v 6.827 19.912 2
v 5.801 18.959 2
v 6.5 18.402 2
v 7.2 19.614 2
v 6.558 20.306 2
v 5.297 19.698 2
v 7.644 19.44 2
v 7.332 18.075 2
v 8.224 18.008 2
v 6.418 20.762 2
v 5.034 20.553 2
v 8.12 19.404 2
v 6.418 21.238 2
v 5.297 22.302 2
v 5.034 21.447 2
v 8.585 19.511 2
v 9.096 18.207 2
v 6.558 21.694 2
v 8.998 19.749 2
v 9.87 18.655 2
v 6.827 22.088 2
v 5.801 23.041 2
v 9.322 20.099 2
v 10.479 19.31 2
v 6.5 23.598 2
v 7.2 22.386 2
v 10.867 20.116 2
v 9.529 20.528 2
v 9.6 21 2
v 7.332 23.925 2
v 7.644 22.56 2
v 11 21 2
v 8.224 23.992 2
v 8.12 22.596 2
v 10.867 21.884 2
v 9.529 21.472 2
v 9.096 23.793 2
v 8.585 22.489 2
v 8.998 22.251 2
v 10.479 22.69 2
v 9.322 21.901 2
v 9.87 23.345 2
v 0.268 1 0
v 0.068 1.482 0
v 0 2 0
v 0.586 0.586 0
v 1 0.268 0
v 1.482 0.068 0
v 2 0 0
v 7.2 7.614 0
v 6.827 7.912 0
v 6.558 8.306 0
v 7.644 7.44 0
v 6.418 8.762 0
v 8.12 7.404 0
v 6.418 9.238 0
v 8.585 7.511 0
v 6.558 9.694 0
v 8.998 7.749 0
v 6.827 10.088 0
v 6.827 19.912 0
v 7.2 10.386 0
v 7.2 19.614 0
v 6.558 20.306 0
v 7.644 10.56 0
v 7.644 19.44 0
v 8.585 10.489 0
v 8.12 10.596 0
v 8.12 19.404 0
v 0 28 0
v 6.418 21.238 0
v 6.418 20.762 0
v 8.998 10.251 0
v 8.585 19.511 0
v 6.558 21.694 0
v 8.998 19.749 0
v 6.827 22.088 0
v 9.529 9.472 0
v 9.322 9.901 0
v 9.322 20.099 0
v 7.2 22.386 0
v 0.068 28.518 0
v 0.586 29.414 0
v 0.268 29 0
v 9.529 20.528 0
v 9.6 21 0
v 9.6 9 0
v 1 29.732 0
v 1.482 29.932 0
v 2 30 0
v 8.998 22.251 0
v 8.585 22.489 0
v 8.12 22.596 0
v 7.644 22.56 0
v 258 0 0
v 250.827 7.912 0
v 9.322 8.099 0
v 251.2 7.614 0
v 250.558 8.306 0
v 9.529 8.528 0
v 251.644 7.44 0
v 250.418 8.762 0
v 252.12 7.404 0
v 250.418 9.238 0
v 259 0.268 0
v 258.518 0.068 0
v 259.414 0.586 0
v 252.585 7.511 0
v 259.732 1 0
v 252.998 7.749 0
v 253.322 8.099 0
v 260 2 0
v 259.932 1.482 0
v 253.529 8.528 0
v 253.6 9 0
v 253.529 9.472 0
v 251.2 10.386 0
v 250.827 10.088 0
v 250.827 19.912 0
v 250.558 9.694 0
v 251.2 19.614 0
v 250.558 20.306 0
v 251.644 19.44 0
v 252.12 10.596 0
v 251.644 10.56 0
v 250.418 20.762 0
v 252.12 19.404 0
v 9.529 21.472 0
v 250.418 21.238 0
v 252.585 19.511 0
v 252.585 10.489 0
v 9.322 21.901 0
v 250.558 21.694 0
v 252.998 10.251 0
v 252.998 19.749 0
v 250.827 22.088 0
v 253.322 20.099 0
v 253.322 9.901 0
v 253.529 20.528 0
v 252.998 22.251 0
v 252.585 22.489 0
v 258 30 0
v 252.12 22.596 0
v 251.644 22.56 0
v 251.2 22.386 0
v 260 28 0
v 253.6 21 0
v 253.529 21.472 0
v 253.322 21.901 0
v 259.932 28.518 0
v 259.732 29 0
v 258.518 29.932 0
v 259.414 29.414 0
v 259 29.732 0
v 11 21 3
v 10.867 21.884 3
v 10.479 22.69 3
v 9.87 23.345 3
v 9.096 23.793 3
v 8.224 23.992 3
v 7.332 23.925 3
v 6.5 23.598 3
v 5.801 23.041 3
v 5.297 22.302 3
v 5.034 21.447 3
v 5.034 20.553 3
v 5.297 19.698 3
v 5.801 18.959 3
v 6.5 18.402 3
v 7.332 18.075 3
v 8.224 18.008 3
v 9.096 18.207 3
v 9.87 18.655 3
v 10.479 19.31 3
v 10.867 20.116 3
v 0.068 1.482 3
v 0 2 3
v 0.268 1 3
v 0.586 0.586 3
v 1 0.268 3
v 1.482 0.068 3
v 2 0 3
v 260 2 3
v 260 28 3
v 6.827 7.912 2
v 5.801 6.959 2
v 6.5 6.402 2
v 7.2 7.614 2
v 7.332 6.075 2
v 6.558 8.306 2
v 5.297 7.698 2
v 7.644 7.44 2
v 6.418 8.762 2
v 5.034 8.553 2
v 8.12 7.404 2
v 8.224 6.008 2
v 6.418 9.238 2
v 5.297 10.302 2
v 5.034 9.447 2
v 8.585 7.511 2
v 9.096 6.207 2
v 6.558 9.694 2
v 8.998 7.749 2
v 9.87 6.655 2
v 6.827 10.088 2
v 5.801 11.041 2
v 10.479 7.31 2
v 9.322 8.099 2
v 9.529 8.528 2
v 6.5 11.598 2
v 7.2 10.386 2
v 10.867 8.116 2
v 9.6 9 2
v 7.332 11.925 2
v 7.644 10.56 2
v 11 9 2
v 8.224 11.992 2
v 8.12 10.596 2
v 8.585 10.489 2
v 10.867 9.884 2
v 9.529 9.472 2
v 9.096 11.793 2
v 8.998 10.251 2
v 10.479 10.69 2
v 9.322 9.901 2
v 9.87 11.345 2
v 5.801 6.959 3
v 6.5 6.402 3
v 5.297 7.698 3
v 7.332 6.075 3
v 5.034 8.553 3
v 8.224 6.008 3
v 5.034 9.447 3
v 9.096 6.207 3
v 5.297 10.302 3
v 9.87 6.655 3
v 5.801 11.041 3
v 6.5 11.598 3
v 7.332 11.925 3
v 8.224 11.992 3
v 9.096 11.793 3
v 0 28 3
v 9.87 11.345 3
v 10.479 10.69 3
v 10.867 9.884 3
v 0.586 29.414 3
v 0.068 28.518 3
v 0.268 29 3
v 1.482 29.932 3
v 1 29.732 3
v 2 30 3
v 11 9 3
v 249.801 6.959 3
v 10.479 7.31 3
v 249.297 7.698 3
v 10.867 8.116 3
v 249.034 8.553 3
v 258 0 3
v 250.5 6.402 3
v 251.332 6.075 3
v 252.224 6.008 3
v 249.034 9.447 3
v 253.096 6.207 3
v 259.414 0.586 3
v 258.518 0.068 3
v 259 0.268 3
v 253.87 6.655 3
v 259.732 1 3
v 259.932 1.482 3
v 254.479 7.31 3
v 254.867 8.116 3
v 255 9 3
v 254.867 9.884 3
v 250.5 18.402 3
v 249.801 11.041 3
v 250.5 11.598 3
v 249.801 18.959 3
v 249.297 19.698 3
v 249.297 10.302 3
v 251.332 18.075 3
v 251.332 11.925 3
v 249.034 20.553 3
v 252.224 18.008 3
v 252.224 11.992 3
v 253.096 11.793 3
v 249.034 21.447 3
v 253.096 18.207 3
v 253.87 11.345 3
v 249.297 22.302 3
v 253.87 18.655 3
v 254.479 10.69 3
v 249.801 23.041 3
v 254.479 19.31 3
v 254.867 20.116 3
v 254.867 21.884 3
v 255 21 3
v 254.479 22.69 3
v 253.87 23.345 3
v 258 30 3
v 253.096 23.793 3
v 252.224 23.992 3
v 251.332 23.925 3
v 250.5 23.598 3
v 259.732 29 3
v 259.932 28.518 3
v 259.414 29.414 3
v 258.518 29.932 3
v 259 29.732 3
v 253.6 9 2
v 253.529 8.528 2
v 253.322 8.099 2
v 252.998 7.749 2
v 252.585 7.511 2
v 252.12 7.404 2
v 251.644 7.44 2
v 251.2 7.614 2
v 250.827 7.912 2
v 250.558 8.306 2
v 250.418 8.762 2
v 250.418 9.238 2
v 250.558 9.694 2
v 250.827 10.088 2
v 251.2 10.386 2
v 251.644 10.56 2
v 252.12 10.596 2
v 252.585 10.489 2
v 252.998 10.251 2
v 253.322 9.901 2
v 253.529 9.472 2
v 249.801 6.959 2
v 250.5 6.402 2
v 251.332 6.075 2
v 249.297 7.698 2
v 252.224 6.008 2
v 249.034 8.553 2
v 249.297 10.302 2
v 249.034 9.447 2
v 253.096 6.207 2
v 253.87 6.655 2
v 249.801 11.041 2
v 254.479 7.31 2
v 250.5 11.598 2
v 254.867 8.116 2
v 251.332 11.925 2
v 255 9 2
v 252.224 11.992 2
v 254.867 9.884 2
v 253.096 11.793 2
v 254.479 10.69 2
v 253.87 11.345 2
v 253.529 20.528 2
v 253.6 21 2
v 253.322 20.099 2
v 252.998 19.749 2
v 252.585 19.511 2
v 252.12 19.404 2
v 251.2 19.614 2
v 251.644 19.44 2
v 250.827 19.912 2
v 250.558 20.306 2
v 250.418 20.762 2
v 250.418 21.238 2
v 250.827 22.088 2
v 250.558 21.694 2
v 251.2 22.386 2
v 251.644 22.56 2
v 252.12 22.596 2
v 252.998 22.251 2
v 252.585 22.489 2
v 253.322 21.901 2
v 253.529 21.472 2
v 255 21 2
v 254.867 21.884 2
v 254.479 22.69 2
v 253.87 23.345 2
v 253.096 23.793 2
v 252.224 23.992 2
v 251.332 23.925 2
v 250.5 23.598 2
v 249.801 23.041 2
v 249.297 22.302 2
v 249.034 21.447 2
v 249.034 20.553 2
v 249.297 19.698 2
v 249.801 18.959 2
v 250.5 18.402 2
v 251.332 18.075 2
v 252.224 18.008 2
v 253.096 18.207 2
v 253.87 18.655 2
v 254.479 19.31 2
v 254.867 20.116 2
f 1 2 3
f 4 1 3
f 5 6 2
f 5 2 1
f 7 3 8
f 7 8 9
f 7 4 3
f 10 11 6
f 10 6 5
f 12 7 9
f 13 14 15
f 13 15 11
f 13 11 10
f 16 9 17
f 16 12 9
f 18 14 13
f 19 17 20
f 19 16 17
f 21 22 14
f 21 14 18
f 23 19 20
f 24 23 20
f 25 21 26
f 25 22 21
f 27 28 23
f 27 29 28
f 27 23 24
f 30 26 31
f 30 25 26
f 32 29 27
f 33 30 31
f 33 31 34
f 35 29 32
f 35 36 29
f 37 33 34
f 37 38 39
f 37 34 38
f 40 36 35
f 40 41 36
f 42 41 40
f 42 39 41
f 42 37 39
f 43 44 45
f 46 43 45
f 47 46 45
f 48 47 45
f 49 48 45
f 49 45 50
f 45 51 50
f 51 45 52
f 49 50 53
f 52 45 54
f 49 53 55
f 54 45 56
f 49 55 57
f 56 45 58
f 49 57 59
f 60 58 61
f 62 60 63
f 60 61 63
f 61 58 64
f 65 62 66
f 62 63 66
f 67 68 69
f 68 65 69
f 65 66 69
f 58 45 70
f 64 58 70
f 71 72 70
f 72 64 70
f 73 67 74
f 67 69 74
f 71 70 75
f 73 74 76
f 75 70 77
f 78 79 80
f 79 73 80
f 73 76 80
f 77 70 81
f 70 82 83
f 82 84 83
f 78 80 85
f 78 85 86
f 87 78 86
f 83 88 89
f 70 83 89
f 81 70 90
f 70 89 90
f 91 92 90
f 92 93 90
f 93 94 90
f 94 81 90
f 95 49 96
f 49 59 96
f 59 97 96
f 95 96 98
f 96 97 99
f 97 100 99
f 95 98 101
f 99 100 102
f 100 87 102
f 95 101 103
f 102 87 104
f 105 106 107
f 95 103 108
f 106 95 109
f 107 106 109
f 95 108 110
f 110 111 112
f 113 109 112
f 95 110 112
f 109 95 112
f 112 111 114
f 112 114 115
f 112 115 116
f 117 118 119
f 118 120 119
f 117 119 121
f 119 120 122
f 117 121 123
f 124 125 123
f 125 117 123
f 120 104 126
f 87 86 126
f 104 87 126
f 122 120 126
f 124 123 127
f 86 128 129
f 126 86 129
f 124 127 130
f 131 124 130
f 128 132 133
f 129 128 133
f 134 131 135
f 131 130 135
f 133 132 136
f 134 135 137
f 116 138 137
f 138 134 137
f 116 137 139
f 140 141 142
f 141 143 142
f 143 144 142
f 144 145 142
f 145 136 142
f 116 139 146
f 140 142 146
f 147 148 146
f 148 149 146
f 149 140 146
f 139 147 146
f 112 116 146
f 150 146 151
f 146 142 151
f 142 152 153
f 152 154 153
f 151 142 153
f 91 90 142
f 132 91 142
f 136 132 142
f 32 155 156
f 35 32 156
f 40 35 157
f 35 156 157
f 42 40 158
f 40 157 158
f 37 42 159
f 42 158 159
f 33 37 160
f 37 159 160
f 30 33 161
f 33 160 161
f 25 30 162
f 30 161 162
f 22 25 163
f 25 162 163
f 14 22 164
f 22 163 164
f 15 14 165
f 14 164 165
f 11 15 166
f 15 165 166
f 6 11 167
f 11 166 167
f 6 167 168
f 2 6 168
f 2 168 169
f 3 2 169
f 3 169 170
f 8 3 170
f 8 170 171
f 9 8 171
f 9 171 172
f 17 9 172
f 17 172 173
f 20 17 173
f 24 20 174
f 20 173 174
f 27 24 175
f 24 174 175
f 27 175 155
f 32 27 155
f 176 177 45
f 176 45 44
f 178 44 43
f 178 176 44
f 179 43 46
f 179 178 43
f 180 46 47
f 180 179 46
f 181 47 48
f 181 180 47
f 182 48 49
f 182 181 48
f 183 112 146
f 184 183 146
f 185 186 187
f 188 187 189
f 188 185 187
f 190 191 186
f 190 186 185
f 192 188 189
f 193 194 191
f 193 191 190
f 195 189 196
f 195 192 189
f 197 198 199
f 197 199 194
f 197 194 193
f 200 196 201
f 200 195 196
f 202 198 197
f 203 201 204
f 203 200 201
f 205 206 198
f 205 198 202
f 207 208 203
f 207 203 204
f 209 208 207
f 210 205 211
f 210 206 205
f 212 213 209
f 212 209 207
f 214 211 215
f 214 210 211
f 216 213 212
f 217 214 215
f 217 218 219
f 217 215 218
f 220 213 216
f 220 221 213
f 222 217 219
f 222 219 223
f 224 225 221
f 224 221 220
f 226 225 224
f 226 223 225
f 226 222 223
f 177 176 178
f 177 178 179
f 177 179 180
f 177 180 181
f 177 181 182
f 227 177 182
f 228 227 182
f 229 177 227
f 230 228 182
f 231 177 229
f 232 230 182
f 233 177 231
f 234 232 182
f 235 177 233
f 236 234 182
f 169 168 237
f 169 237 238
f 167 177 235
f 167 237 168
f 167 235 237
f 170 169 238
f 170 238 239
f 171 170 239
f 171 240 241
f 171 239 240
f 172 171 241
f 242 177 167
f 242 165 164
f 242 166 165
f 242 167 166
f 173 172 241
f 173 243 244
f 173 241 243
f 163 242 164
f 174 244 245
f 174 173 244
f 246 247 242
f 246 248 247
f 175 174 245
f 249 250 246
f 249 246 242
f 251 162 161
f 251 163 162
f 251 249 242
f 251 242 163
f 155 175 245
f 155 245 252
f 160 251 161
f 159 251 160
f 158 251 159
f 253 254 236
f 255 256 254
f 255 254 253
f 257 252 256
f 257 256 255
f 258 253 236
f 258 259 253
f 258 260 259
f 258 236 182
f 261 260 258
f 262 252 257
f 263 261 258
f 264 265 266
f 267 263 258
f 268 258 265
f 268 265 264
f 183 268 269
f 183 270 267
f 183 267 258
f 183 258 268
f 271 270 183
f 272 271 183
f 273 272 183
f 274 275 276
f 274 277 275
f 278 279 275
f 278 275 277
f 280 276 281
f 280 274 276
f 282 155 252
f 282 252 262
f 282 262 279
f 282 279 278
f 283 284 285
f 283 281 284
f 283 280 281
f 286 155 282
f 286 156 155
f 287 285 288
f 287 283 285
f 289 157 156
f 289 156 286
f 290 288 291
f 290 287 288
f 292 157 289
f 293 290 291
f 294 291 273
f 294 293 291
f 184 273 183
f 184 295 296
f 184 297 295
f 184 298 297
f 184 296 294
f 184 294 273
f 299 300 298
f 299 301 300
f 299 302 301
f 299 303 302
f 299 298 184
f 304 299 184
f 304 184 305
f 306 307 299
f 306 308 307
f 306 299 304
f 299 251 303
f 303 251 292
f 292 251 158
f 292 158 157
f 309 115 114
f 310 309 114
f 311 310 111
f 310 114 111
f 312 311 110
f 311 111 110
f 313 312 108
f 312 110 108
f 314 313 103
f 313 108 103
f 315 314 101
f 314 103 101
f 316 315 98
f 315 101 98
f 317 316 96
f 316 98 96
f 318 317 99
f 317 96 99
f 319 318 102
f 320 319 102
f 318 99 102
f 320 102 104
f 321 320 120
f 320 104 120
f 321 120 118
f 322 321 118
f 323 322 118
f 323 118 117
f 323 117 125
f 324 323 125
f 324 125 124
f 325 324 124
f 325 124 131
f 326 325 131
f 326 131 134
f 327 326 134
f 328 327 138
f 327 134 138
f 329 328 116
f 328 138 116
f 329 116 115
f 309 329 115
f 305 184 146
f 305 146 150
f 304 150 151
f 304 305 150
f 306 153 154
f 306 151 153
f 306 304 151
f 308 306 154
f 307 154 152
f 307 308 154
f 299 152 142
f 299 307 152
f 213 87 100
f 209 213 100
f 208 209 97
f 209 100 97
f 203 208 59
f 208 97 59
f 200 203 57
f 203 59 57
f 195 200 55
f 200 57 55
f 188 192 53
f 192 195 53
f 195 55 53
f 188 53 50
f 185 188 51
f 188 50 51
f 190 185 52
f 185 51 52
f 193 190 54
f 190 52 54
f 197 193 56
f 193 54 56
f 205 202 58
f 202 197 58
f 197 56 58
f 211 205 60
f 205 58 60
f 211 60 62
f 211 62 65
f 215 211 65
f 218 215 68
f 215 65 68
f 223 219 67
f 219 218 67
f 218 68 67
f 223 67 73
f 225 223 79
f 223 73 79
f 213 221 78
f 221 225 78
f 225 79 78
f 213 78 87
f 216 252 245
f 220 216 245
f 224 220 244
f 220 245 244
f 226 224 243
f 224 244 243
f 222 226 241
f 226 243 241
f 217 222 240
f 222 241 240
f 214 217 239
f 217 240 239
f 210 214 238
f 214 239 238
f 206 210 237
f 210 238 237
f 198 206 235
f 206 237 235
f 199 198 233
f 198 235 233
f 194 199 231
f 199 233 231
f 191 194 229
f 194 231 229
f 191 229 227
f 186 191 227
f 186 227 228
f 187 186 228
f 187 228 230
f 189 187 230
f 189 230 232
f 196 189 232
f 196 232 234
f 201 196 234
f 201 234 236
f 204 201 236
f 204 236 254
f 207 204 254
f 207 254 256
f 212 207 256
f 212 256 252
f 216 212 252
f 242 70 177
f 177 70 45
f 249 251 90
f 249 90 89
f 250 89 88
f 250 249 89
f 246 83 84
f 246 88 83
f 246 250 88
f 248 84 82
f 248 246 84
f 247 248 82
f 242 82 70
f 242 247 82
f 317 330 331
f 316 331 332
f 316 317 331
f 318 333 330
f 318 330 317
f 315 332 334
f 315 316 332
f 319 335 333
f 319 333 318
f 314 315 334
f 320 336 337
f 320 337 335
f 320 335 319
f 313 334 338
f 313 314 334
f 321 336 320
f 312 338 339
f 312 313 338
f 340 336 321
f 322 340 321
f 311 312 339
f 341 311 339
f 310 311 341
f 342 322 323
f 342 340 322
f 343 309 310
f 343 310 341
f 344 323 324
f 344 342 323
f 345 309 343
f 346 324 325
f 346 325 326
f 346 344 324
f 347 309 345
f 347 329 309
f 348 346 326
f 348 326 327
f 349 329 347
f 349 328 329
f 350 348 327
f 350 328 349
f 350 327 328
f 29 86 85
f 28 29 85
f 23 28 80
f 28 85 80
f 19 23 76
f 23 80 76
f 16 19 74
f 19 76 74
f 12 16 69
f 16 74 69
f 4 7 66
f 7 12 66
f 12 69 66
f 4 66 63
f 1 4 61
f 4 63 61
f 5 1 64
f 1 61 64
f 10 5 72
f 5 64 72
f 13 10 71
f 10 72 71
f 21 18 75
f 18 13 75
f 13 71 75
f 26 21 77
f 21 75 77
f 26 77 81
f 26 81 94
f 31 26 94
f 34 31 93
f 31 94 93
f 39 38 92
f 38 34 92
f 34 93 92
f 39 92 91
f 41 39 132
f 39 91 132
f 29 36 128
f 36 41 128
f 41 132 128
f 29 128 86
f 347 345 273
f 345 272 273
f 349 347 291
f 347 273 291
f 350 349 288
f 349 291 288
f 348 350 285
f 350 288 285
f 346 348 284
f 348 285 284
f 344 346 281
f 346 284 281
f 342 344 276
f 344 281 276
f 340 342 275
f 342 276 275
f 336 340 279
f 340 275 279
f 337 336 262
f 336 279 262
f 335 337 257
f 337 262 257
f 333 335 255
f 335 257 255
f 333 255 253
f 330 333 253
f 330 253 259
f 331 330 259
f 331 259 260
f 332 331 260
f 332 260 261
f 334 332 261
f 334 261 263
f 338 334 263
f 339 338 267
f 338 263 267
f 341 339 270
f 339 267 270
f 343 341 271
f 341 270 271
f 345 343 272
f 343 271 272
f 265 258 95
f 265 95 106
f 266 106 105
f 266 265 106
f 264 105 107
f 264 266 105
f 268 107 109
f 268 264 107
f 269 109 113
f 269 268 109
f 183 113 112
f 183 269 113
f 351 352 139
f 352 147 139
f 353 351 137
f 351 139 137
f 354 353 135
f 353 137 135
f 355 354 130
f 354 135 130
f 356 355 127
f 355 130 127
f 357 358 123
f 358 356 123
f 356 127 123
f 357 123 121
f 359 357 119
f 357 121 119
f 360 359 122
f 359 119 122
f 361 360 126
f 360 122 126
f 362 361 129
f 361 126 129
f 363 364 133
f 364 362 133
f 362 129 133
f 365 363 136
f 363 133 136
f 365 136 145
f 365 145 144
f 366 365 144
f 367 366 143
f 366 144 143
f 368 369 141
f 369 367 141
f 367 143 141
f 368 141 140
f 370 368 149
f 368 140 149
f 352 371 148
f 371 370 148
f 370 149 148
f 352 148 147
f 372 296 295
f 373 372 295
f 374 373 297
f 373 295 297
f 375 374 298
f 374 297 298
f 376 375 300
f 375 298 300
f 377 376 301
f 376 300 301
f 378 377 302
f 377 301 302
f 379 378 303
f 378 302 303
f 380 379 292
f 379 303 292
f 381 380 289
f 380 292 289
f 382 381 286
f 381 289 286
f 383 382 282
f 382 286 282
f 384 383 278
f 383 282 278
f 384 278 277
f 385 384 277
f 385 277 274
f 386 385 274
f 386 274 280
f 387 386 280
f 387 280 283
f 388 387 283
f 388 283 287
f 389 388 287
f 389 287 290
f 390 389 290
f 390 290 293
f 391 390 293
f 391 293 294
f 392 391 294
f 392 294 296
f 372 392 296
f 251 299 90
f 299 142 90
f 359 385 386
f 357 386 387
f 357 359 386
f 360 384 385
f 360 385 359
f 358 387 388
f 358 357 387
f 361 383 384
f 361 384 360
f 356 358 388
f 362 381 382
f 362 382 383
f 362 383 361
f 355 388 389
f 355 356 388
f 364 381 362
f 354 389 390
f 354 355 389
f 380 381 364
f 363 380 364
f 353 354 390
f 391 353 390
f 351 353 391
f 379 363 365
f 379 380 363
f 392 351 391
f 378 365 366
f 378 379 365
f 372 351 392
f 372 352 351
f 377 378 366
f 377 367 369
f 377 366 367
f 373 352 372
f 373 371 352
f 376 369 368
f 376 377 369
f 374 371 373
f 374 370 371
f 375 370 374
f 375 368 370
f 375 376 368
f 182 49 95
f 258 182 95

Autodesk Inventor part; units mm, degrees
ref_plane "YZ Plane" through (0, 0, 0) normal (1, 0, 0) x (0, 1, 0)
ref_plane "XZ Plane" through (0, 0, 0) normal (0, 1, 0) x (-1, 0, 0)
ref_plane "XY Plane" through (0, 0, 0) normal (0, 0, 1) x (1, 0, 0)
sketch "スケッチ1" plane through (0, 0, 0) normal (0, 0, 1) x (1, 0, 0)
  line L0 (0, 0) -> (260, 0)
  line L1 (260, 0) -> (260, 30)
  line L2 (260, 30) -> (0, 30)
  line L3 (0, 30) -> (0, 0)
  line L4 (0, 15) -> (260, 15)
  circle A0 centre (8, 21) radius 1.6
  circle A1 centre (8, 9) radius 1.6
  circle A2 centre (252, 21) radius 1.6
  circle A3 centre (252, 9) radius 1.6
  point P0 (8, 15)
  point P1 (252, 15)
  dimension "d0" = 260
  dimension "d1" = 244
  dimension "d2" = 8
  dimension "d3" = 30
  dimension "d4" = 15
  dimension "d5" = 9
  dimension "d6" = 9
  dimension "d7" = 9
  dimension "d8" = 9
  dimension "d9" = 3.2
  dimension "d10" = 3.2
  dimension "d11" = 3.2
  dimension "d12" = 3.2
extrude "押し出し1" add sketch "スケッチ1" along normal blind 3
sketch "スケッチ2" plane through (0, 0, 3) normal (0, 0, 1) x (1, 0, 0)
  line L0 (0, 30) -> (0, 0) projected
  line L1 (0, 0) -> (260, 0) projected
  line L2 (260, 0) -> (260, 30) projected
  line L3 (260, 30) -> (0, 30) projected
  circle A0 centre (8, 9) radius 1.6 projected
  circle A1 centre (252, 9) radius 1.6 projected
  circle A2 centre (252, 21) radius 1.6 projected
  circle A3 centre (8, 21) radius 1.6 projected
  circle A4 centre (8, 21) radius 3
  circle A5 centre (8, 9) radius 3
  circle A6 centre (252, 21) radius 3
  circle A7 centre (252, 9) radius 3
  dimension "d15" = 6
  dimension "d16" = 6
  dimension "d17" = 6
  dimension "d18" = 6
extrude "押し出し2" cut sketch "スケッチ2" against normal blind 1 contours A1 | A4 | A5 | A6 | A7
fillet "フィレット1" radius 2 4 edges at (260, 30, 1.5) (260, 0, 1.5) (0, 30, 1.5) (0, 0, 1.5)
equation "\"d2\" = -0.5 * d1 + 0.5 * d0"
equation "\"d4\" = 0.5 * d3"
equation "\"d6\" = d5"
equation "\"d7\" = d5"
equation "\"d8\" = d7"
equation "\"d10\" = d9"
equation "\"d11\" = d9"
equation "\"d12\" = d11"
equation "\"d16\" = d15"
equation "\"d17\" = d16"
equation "\"d18\" = d17"
properties part number "BP_BOX-Support-Bar"
